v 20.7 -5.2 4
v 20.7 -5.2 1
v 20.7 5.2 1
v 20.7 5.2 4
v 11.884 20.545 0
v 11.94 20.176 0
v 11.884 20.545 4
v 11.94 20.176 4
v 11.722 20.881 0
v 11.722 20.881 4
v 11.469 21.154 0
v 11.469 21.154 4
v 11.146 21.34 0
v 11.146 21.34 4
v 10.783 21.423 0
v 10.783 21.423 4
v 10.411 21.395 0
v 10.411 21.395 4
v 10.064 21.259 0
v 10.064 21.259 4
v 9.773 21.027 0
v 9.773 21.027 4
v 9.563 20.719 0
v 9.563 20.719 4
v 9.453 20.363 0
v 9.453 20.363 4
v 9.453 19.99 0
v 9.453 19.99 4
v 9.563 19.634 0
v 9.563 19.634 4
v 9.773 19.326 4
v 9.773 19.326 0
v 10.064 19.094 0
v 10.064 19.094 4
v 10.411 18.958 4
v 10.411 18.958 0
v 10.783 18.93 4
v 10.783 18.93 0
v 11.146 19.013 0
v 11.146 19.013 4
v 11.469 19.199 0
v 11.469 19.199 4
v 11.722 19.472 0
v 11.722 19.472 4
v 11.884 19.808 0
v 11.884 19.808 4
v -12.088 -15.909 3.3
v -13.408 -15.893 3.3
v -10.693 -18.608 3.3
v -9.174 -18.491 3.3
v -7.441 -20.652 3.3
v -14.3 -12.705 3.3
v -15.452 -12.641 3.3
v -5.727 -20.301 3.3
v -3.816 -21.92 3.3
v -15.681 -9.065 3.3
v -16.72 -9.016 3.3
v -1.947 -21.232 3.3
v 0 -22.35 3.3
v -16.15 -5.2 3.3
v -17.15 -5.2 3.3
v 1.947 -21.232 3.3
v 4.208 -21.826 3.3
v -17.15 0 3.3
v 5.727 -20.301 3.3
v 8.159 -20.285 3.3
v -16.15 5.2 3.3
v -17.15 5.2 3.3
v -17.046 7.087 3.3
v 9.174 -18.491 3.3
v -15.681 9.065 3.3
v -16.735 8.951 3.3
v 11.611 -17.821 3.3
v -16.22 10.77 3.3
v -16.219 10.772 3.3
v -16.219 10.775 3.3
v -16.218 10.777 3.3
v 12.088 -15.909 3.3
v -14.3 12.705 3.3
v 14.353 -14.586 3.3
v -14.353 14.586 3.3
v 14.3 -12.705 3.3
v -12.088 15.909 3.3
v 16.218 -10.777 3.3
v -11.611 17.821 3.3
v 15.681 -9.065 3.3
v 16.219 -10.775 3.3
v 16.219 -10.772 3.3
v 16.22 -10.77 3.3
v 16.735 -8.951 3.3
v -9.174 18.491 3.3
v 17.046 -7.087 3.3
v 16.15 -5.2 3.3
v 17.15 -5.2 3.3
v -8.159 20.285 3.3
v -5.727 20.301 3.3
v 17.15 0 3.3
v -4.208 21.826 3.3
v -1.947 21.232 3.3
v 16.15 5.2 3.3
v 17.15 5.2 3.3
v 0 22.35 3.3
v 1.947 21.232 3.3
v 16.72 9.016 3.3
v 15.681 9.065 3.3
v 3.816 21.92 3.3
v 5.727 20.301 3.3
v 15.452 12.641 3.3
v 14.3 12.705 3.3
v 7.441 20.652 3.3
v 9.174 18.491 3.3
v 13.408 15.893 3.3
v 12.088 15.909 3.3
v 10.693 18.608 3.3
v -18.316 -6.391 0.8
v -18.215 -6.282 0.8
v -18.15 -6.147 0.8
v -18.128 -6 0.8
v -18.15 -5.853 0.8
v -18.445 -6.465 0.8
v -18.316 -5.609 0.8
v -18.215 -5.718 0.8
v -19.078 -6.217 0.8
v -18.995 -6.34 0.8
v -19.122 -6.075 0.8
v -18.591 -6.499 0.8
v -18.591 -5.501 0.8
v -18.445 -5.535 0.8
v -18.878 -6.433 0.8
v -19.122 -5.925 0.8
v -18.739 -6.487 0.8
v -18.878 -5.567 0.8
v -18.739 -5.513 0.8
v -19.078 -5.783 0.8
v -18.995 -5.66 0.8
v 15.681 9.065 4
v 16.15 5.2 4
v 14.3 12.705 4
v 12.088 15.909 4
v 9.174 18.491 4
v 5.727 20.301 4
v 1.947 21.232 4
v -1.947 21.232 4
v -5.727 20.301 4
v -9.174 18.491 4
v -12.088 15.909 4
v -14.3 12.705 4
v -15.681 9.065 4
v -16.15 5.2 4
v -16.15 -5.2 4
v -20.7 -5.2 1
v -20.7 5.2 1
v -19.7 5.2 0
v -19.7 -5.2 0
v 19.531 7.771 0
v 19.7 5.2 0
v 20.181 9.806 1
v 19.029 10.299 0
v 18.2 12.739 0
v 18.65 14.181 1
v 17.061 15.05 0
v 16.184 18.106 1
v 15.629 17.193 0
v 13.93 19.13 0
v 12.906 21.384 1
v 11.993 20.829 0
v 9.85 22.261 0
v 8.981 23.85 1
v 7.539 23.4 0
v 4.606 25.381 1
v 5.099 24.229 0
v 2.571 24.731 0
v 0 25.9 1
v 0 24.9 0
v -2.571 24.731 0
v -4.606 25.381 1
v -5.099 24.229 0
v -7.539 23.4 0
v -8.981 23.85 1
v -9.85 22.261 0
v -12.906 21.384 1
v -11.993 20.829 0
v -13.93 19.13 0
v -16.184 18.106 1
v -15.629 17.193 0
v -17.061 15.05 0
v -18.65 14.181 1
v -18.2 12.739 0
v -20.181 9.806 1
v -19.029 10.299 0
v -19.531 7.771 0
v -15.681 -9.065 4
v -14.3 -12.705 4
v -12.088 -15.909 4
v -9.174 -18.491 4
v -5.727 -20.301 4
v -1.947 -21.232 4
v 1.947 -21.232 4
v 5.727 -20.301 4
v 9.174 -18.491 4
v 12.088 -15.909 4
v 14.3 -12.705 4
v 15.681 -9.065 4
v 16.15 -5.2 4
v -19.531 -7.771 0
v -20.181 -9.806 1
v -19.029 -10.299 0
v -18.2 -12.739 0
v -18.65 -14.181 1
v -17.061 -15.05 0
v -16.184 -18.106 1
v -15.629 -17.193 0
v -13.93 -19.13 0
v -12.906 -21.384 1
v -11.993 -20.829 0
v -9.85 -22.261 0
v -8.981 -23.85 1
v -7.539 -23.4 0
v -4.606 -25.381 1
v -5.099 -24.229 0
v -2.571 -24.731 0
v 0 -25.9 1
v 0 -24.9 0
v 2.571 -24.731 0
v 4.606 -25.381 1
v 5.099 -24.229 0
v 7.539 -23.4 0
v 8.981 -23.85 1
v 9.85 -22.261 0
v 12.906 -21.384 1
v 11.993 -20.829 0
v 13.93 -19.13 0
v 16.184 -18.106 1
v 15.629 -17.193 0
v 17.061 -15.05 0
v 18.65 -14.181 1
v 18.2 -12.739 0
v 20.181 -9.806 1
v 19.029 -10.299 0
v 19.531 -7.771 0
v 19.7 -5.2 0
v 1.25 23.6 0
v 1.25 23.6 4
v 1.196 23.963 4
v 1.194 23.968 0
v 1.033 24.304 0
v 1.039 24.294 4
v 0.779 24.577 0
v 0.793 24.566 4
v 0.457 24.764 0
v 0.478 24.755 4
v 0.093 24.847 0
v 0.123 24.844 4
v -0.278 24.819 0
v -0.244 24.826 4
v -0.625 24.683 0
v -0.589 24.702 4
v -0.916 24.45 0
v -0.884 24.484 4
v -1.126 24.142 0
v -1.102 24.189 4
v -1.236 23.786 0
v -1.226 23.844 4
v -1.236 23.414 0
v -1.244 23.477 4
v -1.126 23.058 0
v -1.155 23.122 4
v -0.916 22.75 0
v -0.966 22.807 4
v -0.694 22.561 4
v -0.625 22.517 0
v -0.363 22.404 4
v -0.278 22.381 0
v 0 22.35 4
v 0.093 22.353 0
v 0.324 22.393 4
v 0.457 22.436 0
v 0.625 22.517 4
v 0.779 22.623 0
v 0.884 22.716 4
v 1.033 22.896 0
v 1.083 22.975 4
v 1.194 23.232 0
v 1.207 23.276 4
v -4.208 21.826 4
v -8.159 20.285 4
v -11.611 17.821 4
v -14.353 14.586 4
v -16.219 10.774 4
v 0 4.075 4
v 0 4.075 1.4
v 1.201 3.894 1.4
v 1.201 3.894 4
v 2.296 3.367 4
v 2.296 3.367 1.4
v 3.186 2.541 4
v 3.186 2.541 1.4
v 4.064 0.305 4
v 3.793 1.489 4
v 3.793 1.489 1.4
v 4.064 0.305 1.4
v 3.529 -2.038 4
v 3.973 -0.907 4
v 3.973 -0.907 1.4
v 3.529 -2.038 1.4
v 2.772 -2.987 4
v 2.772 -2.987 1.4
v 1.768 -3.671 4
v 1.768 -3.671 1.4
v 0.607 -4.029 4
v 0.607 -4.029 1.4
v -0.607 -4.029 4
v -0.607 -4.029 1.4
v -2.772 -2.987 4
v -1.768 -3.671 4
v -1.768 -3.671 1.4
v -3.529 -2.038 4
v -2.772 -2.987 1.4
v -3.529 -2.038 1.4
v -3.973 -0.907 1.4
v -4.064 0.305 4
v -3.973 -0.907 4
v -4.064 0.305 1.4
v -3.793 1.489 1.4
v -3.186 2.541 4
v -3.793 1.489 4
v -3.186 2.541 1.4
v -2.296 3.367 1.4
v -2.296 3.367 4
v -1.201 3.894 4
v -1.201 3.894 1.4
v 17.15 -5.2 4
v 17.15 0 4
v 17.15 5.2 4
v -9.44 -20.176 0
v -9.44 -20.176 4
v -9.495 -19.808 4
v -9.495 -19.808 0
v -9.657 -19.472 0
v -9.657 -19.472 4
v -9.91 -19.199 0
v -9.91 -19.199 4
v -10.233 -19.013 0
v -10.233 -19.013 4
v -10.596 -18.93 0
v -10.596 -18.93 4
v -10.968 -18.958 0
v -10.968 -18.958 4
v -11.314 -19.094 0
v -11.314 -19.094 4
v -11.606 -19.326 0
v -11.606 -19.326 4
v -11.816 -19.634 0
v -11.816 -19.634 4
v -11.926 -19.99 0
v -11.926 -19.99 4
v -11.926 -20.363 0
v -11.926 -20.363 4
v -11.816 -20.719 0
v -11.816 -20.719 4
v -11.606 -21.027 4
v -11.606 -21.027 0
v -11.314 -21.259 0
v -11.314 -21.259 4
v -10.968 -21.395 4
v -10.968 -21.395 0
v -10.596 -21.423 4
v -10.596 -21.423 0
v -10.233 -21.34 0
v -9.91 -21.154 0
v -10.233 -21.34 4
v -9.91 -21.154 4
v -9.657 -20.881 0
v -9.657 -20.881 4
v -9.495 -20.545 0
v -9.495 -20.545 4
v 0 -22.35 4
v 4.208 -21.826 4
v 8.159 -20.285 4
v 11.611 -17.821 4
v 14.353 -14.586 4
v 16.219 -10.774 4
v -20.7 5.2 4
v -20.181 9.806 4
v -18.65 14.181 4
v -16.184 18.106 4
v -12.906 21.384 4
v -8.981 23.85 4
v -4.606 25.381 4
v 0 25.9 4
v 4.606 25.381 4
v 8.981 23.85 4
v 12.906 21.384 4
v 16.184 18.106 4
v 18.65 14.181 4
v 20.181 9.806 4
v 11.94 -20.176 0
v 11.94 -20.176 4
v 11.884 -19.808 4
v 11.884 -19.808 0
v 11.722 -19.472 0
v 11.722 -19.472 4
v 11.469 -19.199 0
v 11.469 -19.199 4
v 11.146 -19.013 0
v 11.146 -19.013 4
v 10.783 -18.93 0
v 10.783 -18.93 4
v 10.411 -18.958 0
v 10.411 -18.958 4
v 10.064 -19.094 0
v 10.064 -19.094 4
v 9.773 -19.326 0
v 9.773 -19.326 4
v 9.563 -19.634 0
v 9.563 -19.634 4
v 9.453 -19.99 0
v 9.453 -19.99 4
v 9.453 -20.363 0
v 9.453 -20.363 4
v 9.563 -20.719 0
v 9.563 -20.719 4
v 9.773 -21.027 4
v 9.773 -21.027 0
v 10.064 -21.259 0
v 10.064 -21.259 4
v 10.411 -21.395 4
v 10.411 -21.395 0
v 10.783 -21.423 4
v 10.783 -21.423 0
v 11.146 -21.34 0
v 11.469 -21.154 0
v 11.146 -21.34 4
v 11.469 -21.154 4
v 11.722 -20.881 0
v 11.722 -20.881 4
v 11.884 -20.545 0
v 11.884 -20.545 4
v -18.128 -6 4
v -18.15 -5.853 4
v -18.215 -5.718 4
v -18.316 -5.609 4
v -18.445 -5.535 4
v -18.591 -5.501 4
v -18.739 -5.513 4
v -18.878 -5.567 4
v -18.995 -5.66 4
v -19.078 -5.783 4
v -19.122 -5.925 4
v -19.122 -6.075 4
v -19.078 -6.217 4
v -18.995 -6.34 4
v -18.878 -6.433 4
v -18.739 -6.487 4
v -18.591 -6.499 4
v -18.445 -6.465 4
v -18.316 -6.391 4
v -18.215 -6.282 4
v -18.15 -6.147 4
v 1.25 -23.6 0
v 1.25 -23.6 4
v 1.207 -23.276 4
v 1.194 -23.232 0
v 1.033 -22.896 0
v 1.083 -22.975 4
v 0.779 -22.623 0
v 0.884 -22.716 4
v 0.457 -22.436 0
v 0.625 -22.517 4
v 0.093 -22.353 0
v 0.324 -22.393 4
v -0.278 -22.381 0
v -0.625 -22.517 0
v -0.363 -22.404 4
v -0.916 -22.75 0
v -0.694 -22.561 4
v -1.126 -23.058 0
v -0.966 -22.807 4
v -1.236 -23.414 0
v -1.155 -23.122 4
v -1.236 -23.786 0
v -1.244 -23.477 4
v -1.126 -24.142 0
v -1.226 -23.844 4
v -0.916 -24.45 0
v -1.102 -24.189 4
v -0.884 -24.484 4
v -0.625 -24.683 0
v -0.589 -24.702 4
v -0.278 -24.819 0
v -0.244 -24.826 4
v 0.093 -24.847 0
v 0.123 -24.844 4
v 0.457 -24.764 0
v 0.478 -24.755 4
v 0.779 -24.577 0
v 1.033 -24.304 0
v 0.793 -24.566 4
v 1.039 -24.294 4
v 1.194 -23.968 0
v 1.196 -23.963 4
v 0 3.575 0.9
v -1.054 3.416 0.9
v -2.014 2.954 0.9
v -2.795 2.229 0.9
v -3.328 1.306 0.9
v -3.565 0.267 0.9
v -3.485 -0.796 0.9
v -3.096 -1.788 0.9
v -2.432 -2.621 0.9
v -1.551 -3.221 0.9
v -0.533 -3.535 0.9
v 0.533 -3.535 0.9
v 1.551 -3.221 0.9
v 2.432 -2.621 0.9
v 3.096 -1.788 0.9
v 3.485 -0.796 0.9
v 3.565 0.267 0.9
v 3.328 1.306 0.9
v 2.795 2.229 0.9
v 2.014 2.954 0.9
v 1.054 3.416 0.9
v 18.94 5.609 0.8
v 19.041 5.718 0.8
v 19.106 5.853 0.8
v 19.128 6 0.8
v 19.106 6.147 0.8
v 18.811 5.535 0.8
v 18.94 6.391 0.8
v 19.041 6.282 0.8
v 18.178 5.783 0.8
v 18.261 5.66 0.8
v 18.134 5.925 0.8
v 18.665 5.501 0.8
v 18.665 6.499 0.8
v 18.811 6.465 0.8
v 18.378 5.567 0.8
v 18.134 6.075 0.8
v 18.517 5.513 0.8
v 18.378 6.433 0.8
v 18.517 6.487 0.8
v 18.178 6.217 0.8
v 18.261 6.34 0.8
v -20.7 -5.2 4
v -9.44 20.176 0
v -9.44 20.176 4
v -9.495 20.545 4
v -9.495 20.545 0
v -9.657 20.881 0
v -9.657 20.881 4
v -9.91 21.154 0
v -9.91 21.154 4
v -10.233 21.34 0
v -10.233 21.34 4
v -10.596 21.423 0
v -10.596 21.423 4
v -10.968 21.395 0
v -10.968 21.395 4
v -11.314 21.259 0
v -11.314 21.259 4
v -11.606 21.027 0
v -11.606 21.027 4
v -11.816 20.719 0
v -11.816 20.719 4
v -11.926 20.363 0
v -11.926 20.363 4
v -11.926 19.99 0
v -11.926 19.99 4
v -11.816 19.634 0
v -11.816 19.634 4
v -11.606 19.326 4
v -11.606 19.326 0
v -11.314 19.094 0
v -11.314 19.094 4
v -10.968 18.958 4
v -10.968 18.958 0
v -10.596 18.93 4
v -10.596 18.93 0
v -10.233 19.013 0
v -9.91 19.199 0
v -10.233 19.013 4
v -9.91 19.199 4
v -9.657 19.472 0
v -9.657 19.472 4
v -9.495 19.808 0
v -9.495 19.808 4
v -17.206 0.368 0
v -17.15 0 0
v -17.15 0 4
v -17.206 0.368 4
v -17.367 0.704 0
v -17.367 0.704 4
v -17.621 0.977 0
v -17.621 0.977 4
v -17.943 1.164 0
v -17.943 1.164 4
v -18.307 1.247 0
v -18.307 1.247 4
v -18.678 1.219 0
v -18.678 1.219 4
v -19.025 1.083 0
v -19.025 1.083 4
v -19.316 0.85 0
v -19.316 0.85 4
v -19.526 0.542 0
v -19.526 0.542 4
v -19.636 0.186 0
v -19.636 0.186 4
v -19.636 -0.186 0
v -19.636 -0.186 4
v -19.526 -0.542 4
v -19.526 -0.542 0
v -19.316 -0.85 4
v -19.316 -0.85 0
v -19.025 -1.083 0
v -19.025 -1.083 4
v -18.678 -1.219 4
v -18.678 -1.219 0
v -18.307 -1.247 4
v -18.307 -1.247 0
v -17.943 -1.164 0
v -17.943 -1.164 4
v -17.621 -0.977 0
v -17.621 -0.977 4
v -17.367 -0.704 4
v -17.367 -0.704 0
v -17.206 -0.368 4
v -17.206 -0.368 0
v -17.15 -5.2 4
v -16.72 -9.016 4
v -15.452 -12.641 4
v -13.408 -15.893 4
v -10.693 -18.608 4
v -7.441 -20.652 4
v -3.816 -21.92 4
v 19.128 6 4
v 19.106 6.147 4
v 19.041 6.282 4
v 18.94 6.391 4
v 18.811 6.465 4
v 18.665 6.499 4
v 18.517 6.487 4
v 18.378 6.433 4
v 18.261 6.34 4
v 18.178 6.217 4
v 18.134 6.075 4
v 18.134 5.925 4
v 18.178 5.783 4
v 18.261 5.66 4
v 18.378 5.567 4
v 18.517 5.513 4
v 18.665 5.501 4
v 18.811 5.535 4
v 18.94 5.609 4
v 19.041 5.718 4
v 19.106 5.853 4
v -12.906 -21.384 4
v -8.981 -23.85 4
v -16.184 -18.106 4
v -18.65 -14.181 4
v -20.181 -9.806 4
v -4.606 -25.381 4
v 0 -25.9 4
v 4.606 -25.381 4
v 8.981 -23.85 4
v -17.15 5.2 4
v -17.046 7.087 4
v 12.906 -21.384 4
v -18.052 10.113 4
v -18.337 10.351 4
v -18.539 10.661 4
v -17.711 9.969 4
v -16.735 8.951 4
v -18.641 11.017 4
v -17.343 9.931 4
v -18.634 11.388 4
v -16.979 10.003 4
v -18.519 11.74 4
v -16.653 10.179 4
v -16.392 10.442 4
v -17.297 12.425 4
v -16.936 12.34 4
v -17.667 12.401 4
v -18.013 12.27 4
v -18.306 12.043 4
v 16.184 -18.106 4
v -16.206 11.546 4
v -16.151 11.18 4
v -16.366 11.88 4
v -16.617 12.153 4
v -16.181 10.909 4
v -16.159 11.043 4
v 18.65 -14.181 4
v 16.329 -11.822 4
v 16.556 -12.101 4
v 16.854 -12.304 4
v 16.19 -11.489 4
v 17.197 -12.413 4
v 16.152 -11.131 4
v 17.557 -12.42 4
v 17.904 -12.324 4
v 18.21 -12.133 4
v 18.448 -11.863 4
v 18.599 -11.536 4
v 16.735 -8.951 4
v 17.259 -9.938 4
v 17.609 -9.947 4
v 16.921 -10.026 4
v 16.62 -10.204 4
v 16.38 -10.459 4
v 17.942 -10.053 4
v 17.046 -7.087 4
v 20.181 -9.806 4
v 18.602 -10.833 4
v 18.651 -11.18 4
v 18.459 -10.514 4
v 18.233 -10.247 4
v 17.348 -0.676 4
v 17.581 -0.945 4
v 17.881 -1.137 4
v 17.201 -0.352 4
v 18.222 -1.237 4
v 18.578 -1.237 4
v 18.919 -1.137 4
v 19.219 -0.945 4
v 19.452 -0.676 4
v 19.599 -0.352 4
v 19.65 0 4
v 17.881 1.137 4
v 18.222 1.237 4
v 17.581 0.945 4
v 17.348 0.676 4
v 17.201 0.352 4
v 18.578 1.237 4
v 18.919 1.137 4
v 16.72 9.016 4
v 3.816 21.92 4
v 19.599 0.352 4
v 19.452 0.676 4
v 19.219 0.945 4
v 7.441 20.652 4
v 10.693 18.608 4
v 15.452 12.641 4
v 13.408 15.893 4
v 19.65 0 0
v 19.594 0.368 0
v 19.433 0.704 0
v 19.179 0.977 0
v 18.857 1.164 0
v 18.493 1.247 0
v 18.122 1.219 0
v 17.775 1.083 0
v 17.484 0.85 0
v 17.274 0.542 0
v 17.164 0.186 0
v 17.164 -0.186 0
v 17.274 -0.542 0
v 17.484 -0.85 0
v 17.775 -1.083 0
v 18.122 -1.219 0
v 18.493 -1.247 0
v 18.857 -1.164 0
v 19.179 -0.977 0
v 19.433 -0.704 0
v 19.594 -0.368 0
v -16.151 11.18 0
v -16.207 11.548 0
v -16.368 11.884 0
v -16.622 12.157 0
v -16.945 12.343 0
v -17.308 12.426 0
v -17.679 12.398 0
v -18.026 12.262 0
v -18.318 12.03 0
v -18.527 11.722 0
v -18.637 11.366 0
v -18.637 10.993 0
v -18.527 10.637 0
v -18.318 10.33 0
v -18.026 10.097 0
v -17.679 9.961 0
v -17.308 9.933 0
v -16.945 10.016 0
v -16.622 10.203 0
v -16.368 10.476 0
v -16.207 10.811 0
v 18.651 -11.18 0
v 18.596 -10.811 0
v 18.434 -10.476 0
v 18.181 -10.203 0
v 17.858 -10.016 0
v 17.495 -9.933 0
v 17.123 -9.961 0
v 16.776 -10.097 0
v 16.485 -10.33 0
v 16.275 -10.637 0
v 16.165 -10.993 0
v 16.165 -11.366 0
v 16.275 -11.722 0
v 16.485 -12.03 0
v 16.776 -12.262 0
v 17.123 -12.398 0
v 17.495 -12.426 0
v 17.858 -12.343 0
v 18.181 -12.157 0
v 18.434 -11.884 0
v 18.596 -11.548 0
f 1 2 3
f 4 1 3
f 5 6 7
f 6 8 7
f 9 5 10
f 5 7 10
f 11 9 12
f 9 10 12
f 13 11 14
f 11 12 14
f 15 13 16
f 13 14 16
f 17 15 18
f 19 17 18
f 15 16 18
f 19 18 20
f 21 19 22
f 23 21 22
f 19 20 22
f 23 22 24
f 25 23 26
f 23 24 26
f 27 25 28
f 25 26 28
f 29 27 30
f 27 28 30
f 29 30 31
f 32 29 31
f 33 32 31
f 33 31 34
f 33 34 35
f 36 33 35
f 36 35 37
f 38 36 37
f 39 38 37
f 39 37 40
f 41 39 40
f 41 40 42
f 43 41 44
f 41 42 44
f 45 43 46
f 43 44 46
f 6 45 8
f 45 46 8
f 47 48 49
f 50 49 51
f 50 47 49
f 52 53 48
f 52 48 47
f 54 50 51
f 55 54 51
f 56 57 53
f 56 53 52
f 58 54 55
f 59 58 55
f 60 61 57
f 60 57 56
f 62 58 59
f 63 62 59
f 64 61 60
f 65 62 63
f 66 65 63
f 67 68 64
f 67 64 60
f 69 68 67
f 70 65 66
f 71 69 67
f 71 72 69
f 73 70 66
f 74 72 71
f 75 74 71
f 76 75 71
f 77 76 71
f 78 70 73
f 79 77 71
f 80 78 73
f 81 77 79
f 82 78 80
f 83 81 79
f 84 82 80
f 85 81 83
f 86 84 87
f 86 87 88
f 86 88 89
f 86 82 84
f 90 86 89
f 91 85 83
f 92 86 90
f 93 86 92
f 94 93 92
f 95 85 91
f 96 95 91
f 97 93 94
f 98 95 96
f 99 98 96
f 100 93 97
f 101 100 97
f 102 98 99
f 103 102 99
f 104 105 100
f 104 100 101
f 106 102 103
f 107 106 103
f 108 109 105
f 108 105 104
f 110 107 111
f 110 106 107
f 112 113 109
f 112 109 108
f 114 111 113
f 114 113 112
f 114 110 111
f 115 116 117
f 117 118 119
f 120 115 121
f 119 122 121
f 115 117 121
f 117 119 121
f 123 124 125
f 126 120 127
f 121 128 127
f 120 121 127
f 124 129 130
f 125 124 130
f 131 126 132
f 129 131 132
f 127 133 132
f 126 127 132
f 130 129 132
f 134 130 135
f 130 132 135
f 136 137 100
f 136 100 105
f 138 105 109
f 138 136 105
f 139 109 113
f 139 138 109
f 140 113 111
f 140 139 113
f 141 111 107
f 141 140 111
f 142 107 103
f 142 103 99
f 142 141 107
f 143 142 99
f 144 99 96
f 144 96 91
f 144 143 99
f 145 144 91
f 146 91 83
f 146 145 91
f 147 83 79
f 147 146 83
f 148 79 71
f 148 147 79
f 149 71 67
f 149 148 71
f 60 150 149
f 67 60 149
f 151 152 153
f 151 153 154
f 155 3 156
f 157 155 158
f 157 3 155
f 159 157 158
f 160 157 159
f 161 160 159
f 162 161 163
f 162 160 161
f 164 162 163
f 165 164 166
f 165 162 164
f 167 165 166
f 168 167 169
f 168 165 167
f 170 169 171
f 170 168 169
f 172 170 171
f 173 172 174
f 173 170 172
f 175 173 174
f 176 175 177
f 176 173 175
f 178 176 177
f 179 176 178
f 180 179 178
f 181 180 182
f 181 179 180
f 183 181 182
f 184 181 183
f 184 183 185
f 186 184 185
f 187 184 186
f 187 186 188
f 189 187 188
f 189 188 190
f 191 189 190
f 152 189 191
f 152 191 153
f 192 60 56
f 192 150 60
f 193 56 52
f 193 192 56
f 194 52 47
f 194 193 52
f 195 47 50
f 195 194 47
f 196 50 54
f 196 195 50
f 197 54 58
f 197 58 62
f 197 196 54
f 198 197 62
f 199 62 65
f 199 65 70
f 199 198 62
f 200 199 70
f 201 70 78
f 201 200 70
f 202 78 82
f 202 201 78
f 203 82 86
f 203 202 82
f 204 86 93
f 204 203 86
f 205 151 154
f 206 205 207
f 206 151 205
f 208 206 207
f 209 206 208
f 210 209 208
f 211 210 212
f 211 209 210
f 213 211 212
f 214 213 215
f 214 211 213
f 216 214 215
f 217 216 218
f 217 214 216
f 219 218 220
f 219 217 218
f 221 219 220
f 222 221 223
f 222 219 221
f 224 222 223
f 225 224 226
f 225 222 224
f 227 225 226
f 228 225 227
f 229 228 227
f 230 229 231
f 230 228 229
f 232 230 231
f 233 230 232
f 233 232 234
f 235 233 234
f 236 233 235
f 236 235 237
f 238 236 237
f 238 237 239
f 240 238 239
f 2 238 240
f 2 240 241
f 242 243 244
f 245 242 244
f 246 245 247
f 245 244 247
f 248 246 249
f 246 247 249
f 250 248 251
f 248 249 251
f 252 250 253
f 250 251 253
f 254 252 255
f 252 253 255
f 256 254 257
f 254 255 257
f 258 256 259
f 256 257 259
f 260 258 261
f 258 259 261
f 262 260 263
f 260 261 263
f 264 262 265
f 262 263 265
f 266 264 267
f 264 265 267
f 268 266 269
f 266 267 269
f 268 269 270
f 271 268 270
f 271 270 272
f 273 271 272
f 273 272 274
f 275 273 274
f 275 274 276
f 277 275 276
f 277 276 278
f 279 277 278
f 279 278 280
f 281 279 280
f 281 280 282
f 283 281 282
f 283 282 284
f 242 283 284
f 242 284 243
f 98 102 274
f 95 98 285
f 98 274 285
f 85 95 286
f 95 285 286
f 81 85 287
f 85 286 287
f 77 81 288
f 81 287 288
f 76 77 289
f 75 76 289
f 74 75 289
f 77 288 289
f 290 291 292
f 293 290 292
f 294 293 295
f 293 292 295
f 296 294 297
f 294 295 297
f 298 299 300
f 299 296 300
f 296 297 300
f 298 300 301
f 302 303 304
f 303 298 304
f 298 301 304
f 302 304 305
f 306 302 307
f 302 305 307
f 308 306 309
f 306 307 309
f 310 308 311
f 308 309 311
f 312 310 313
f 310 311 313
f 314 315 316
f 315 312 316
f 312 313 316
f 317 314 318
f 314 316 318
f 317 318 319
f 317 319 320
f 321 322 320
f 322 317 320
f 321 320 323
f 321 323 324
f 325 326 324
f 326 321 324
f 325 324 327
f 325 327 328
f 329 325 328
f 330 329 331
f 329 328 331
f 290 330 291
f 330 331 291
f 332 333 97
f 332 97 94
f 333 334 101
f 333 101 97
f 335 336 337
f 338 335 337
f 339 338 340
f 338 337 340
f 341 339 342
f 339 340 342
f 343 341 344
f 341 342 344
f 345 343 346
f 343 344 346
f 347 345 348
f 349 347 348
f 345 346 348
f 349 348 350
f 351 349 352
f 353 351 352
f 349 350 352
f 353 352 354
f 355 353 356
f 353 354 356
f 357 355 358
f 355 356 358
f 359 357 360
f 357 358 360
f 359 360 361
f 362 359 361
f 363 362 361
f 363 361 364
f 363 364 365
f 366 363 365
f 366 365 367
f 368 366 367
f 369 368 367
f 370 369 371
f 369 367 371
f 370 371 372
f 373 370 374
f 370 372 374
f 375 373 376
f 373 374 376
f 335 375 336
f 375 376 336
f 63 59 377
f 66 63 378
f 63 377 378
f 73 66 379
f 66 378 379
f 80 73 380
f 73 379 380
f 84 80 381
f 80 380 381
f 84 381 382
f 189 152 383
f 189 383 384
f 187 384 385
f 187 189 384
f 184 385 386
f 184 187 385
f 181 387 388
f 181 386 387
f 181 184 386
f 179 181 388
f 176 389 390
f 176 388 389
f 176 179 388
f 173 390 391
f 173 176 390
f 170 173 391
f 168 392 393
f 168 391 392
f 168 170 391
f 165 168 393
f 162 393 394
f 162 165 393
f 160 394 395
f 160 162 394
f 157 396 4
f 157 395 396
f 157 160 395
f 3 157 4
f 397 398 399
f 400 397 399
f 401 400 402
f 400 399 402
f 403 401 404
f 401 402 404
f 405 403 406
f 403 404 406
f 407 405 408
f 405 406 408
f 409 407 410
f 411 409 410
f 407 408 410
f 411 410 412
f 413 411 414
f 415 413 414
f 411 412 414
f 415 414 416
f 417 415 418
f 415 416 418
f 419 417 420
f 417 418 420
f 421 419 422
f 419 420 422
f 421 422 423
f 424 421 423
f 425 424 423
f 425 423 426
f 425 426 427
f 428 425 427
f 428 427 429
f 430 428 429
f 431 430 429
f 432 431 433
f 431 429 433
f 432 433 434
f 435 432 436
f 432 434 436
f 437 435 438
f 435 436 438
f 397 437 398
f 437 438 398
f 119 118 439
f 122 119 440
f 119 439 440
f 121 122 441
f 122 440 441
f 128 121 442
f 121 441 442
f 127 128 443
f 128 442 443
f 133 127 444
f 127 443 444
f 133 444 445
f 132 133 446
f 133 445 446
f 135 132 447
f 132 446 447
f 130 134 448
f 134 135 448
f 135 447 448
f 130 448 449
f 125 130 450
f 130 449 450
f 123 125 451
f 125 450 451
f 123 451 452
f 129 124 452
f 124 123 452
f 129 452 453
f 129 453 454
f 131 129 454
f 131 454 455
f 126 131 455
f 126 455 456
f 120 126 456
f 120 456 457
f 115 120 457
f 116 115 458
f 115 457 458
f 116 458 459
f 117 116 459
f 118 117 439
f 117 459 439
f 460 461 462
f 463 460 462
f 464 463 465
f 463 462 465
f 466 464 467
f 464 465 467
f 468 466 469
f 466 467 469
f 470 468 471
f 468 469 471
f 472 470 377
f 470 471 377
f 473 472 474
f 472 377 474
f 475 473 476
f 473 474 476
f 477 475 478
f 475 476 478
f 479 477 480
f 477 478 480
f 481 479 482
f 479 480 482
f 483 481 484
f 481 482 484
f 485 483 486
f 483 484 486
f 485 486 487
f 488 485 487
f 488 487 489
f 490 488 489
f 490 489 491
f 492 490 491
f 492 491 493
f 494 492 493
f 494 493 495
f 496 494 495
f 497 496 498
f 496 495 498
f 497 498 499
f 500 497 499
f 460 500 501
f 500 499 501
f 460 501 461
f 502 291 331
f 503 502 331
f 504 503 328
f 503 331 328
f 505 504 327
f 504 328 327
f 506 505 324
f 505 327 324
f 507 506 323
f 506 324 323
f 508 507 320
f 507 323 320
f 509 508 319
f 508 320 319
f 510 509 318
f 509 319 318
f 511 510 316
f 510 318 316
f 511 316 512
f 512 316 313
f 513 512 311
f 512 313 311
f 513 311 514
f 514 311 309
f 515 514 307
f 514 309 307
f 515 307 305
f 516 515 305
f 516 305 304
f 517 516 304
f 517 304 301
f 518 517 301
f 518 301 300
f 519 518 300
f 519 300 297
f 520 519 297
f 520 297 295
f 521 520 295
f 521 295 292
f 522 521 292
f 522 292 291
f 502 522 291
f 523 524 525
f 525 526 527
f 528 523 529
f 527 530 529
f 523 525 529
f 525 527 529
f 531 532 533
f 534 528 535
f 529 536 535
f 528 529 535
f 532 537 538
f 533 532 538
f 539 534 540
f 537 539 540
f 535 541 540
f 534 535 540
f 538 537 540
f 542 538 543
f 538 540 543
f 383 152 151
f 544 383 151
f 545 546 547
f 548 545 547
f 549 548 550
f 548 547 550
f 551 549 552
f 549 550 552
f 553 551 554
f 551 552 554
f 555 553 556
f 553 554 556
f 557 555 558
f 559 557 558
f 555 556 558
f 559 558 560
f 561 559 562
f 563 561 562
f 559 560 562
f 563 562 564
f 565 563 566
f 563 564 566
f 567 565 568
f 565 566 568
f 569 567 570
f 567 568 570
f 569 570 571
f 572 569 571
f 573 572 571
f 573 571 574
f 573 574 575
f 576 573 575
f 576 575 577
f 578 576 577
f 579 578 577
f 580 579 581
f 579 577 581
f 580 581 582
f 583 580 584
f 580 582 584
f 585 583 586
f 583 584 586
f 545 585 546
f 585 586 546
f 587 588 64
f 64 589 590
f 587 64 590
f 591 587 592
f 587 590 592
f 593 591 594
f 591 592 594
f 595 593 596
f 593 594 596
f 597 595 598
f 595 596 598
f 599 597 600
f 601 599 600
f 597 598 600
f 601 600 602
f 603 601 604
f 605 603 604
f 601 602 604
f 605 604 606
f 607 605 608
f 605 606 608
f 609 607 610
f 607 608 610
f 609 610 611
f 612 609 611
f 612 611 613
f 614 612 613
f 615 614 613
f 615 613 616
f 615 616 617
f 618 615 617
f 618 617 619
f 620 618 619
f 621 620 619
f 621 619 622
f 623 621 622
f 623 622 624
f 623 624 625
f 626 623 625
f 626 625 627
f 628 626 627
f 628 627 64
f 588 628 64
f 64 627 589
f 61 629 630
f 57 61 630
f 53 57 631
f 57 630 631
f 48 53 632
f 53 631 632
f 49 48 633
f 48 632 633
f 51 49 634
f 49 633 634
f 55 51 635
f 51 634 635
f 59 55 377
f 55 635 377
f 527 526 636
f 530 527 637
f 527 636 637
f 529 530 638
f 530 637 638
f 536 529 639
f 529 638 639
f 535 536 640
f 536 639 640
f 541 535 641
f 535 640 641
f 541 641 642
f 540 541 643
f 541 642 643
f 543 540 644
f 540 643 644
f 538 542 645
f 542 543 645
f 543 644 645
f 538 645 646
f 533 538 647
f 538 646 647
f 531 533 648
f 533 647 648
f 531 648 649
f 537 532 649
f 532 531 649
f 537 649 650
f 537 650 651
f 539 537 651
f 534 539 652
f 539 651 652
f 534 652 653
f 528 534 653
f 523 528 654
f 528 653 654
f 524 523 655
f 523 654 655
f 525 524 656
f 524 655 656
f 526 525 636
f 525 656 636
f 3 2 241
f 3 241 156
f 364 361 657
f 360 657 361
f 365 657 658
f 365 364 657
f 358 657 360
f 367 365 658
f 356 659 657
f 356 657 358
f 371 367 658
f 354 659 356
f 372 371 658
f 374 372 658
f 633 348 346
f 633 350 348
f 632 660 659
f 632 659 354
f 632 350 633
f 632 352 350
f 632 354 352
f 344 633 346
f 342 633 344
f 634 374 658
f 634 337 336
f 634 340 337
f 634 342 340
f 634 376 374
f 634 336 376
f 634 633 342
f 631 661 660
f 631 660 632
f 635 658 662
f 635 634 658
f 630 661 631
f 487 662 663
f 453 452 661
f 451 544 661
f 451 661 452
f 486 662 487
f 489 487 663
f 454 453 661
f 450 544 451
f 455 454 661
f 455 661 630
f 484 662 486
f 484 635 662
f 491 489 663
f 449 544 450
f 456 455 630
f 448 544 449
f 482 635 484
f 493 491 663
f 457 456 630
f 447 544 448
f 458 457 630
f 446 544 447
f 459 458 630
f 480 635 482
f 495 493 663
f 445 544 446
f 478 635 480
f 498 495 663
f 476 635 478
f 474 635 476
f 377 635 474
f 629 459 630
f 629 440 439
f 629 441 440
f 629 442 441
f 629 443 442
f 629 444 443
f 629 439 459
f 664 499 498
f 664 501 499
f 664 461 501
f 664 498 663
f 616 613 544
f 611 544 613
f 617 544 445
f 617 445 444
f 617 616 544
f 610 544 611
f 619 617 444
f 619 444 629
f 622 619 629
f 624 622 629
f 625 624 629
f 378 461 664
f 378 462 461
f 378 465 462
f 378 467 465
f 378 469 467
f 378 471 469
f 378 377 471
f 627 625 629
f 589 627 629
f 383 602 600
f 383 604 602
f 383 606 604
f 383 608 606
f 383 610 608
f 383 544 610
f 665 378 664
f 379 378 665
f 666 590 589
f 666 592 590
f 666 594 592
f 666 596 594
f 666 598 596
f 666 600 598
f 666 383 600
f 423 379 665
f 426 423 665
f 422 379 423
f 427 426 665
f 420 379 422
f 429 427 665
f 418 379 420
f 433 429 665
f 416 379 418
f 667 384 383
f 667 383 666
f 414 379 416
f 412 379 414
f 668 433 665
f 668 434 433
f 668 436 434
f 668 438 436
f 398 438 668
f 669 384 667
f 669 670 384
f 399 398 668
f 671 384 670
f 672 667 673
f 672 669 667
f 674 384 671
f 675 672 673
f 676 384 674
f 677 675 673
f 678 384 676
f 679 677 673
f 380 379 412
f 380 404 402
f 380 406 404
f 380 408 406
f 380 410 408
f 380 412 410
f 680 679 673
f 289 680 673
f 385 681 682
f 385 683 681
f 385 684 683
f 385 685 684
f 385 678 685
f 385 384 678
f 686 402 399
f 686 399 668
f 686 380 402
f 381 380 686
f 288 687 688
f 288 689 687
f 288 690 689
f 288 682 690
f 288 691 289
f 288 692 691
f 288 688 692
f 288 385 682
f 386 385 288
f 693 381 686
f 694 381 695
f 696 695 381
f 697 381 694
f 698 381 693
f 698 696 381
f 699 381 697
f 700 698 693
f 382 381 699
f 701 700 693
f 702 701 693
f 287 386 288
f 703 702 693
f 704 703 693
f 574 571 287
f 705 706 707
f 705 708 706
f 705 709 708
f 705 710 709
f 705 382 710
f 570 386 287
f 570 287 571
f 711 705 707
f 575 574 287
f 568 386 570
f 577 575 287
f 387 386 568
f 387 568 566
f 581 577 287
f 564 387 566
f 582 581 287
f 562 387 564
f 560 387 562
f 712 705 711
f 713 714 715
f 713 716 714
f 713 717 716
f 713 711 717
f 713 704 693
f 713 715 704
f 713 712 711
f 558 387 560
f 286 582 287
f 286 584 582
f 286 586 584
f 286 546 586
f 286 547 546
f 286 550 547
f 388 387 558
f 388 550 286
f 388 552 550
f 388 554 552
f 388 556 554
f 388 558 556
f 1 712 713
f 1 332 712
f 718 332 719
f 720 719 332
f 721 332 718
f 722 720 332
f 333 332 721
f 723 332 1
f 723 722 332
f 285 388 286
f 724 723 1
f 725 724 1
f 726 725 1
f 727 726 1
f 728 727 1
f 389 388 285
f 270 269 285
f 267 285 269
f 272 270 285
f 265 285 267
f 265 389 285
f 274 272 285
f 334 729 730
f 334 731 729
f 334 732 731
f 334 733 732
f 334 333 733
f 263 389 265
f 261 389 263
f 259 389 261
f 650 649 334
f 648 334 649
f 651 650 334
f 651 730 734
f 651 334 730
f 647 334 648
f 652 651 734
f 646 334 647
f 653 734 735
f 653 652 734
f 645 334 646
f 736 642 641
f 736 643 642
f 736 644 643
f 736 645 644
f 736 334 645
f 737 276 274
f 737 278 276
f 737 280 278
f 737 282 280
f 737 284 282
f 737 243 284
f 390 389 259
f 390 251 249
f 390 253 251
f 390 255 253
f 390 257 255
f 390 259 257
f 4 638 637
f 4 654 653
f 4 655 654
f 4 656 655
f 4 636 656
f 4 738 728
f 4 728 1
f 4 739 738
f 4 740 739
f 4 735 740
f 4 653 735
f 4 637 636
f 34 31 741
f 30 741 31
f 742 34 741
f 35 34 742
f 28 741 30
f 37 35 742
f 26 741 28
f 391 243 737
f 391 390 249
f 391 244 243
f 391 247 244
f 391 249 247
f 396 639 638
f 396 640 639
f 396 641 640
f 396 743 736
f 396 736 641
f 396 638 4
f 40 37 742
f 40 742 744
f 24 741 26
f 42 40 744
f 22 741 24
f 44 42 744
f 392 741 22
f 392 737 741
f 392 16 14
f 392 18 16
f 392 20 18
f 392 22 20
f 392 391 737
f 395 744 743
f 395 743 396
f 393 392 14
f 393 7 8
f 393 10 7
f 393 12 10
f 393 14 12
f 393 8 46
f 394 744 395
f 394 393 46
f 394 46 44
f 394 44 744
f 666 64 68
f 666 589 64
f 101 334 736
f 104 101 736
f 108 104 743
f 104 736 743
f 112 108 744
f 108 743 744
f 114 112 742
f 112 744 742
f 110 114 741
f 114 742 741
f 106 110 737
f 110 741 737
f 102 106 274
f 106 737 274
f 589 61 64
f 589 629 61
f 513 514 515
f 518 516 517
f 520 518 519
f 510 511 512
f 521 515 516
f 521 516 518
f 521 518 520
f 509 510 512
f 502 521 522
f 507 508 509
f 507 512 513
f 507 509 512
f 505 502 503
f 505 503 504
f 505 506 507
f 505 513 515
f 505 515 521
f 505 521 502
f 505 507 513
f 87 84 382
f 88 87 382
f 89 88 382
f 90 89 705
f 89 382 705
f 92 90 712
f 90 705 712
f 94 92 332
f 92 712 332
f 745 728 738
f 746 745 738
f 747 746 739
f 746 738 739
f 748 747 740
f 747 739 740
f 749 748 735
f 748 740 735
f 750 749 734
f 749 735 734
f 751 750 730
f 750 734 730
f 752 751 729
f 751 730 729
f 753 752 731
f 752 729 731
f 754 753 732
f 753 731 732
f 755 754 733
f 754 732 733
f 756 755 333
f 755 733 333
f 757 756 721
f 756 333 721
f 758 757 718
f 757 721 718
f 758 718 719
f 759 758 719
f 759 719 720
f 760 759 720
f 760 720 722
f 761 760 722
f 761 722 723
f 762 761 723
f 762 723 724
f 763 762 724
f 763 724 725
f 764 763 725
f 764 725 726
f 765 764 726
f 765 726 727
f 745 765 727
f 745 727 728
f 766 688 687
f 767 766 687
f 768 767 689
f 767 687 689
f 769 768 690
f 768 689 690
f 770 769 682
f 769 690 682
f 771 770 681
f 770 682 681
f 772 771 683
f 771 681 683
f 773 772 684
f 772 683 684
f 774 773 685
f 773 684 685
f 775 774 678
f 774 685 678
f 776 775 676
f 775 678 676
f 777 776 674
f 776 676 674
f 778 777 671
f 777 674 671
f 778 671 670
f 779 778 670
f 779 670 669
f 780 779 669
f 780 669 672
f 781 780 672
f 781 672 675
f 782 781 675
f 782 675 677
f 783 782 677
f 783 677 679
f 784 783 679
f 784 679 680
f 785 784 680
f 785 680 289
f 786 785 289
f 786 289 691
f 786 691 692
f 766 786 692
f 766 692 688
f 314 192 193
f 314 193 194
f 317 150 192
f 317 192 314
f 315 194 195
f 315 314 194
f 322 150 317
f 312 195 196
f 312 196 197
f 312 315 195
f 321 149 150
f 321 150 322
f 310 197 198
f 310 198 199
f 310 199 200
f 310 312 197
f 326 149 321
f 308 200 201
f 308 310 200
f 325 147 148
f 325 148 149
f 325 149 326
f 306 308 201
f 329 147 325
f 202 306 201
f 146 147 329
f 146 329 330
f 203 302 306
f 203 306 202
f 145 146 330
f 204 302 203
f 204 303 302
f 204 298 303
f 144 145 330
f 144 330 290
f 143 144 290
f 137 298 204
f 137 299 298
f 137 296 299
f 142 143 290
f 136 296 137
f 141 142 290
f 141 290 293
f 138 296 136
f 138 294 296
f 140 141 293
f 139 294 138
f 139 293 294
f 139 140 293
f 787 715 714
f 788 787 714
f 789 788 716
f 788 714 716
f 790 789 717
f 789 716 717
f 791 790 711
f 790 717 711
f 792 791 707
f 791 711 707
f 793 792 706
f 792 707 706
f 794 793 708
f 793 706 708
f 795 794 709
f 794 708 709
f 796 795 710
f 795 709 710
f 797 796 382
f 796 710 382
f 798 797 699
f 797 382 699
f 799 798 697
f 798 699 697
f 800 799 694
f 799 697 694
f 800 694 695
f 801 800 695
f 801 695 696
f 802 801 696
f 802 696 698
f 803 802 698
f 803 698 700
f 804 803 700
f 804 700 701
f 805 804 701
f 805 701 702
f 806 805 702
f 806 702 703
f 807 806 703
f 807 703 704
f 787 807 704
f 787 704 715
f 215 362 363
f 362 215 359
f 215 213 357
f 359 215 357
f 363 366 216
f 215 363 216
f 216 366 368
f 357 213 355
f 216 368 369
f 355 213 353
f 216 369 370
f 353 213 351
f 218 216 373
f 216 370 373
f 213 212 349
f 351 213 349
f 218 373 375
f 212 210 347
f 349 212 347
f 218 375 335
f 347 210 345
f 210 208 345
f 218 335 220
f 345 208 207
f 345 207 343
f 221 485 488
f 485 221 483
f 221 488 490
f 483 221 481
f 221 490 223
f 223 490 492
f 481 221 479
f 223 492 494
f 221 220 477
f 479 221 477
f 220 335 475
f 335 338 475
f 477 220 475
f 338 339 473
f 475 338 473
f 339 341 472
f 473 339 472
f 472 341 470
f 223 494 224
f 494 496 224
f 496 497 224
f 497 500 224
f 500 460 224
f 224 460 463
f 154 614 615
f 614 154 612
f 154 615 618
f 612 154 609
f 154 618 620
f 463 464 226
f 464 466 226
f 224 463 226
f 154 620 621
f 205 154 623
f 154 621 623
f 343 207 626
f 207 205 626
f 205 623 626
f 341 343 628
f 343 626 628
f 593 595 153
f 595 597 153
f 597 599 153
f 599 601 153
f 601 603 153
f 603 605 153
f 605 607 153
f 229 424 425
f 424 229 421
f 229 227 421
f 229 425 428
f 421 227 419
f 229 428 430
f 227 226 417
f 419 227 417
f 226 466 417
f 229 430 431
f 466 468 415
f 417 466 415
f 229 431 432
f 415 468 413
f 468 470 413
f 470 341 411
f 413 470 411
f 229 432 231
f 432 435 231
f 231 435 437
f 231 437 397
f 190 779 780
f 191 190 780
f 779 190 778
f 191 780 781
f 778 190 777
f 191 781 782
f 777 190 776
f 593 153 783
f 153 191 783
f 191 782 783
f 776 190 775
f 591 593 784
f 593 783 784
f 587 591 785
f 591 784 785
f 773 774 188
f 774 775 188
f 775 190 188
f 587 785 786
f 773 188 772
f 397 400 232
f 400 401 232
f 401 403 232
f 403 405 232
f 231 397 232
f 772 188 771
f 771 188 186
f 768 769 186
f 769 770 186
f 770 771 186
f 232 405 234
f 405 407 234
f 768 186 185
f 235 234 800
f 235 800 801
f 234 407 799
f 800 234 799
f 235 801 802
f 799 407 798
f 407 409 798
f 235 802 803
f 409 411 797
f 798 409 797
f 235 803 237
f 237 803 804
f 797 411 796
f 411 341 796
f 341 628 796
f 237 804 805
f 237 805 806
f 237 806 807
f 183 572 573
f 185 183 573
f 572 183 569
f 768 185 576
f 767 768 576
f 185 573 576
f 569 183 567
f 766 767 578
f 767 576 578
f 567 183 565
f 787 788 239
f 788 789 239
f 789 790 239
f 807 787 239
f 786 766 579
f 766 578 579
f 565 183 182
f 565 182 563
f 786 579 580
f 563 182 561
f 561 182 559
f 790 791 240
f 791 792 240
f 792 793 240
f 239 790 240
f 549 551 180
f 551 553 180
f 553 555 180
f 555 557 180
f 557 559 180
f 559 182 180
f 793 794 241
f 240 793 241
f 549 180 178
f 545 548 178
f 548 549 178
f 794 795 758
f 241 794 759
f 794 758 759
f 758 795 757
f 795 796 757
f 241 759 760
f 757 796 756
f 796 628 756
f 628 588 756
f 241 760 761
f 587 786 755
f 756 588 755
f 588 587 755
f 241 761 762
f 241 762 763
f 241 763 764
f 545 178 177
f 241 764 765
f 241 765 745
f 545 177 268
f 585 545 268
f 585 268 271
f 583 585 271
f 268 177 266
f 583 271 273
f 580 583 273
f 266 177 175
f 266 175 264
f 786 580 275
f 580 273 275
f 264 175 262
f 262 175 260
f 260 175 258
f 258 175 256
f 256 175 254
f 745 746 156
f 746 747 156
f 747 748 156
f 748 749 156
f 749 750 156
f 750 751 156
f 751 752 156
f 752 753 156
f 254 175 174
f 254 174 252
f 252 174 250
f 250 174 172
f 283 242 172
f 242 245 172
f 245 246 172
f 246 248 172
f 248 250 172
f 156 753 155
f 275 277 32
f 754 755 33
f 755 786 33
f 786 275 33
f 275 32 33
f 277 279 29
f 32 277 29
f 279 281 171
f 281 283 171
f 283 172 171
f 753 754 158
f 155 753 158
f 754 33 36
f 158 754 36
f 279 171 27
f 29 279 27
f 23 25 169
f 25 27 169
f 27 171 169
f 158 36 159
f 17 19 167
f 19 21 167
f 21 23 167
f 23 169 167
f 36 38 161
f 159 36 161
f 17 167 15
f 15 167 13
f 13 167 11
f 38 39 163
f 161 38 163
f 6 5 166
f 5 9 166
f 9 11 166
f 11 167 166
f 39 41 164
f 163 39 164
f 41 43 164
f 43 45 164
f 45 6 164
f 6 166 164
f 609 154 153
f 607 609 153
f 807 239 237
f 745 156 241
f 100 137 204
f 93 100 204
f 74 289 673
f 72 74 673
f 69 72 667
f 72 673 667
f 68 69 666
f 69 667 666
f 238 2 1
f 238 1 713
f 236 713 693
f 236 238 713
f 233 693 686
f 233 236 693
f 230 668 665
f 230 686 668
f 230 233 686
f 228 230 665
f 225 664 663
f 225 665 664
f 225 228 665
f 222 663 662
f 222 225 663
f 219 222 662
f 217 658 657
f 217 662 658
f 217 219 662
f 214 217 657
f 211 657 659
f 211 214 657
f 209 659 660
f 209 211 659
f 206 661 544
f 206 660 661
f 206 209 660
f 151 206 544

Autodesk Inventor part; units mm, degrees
ref_plane "YZ Plane" through (0, 0, 0) normal (1, 0, 0) x (0, 1, 0)
ref_plane "XZ Plane" through (0, 0, 0) normal (0, 1, 0) x (-1, 0, 0)
ref_plane "XY Plane" through (0, 0, 0) normal (0, 0, 1) x (1, 0, 0)
sketch "Sketch1" plane through (0, 0, 0) normal (0, 0, 1) x (1, 0, 0)
  line L0 (0, 0) -> (0, 5.2) construction
  arc A0 (15.6034, 1.2322) -> (-15.6034, 1.2322) centre (0, 5.2) ccw construction
  line L1 (0, 0) -> (0, -5.2) construction
  arc A1 (-15.6034, -1.2322) -> (15.6034, -1.2322) centre (0, -5.2) ccw construction
  line L2 (0, 5.2) -> (0, -5.2) construction
  line L3 (-20.7, 5.2) -> (-20.7, -5.2)
  line L4 (20.7, -5.2) -> (20.7, 5.2)
  arc A2 (20.7, 5.2) -> (-20.7, 5.2) centre (0, 5.2) ccw
  arc A3 (-20.7, -5.2) -> (20.7, -5.2) centre (0, -5.2) ccw
  arc A4 (-15.6034, -1.2322) -> (-15.6034, 1.2322) centre (-20.4492, 0) ccw construction
  arc A5 (15.6034, 1.2322) -> (15.6034, -1.2322) centre (20.4492, 0) ccw construction
  line L5 (0, 5.2) -> (0, -5.2) construction
  circle A6 centre (0, 0) radius 14.5 construction
  dimension "d0" = 10.4
  dimension "d1" = 16.1
  dimension "d2" = 4.6
  dimension "d3" = 5
  dimension "d4" = 41.4
  dimension "d8" = 29
extrude "Extrusion1" add sketch "Sketch1" along normal blind 4
sketch "Sketch2" plane through (0, 0, 4) normal (0, 0, 1) x (1, 0, 0)
  line L0 (-20.7, 5.2) -> (-20.7, -5.2) construction
  arc A0 (-20.7, -5.2) -> (20.7, -5.2) centre (0, -5.2) ccw construction
  line L1 (20.7, -5.2) -> (20.7, 5.2) construction
  arc A1 (20.7, 5.2) -> (-20.7, 5.2) centre (0, 5.2) ccw construction
  line L2 (-18.4, 5.2) -> (-18.4, -5.2) construction
  arc A2 (-18.4, -5.2) -> (18.4, -5.2) centre (0, -5.2) ccw construction
  line L3 (18.4, -5.2) -> (18.4, 5.2) construction
  arc A3 (18.4, 5.2) -> (-18.4, 5.2) centre (0, 5.2) ccw construction
  circle A4 centre (-18.4, 0) radius 1.25
  circle A5 centre (0, 23.6) radius 1.25
  circle A6 centre (-10.6895, 20.1765) radius 1.25
  circle A7 centre (-17.4012, 11.1798) radius 1.25
  line L4 (-18.4, 0) -> (-17.4012, 11.1798) construction
  line L5 (-17.4012, 11.1798) -> (-10.6895, 20.1765) construction
  line L6 (-10.6895, 20.1765) -> (0, 23.6) construction
  line L7 (-18.4, 0) -> (0, 0) construction
  line L8 (0, 0) -> (0, 23.6) construction
  circle A8 centre (18.4, 0) radius 1.25
  circle A9 centre (10.6895, 20.1765) radius 1.25
  circle A10 centre (17.4012, 11.1798) radius 1.25
  circle A11 centre (0, -23.6) radius 1.25
  circle A12 centre (-10.6895, -20.1765) radius 1.25
  circle A13 centre (-17.4012, -11.1798) radius 1.25
  circle A14 centre (10.6895, -20.1765) radius 1.25
  circle A15 centre (17.4012, -11.1798) radius 1.25
  line L9 (-18.4, 0) -> (-18.4, -6) construction
  line L10 (-18.4, -6) -> (-18.628, -6) construction
  line L11 (18.4, 0) -> (18.4, 6) construction
  line L12 (18.4, 6) -> (18.628, 6) construction
  circle A16 centre (-18.628, -6) radius 0.5
  circle A17 centre (18.628, 6) radius 0.5
  dimension "d37" = 2.3
  dimension "d38" = 2.5
  dimension "d39" = 6
  dimension "d40" = 0.228
  dimension "d41" = 6
  dimension "d42" = 0.228
  dimension "d43" = 1
extrude "Extrusion2" cut sketch "Sketch2" against normal through all contours A4 | A5 | A6 | A7 | A8 | A9 | A11 | A12 | A14 | A15 | A16 | A17
sketch "Sketch5" plane through (0, 0, 4) normal (0, 0, 1) x (1, 0, 0)
  line L0 (20.7, -5.2) -> (20.7, 5.2) construction
  arc A0 (20.7, 5.2) -> (-20.7, 5.2) centre (0, 5.2) ccw construction
  line L1 (-20.7, 5.2) -> (-20.7, -5.2) construction
  arc A1 (-20.7, -5.2) -> (20.7, -5.2) centre (0, -5.2) ccw construction
  arc A2 (17.15, 5.2) -> (-17.15, 5.2) centre (0, 5.2) ccw
  line L2 (17.15, 5.2) -> (17.15, -5.2)
  arc A3 (-17.15, -5.2) -> (17.15, -5.2) centre (0, -5.2) ccw
  line L3 (-17.15, -5.2) -> (-17.15, 5.2)
  arc A4 (16.15, 5.2) -> (-16.15, 5.2) centre (0, 5.2) ccw
  line L4 (16.15, 5.2) -> (16.15, -5.2)
  arc A5 (-16.15, -5.2) -> (16.15, -5.2) centre (0, -5.2) ccw
  line L5 (-16.15, -5.2) -> (-16.15, 5.2)
  point P0 (0, 0)
  dimension "d20" = 1
extrude "Extrusion5" cut sketch "Sketch5" against normal blind 0.7
fillet "Fillet1" [suppressed]
chamfer "Chamfer1" distance 1 angle 45 4 edges at (0, -25.9, 0) (20.7, 0, 0) (0, 25.9, 0) (-20.7, 0, 0)
sketch "Sketch8" plane through (0, 0, 0) normal (1, 0, 0) x (0, 1, 0)
  line L0 (0, 0) -> (5.2, 0) construction
  line L1 (0, 0) -> (0, 0.9) construction
  line L2 (-5.2, 4) -> (5.2, 4) construction
  line L3 (0, 4) -> (4.075, 4)
  line L4 (4.075, 4) -> (4.075, 1.4)
  line L5 (4.075, 1.4) -> (3.575, 0.9)
  line L6 (3.575, 0.9) -> (0, 0.9)
  line L7 (0, 0.9) -> (0, 4)
  dimension "d44" = 4.075
  dimension "d45" = 135
  dimension "d46" = 2.6
  dimension "d47" = 0.5
  dimension "d48" = 0.9
revolve "Revolution1" cut sketch "Sketch8" angle 360 about axis through (0, 0, 0.9) along (0, 0, 1)
sketch "Sketch9" plane through (0, 0, 0) normal (0, 0, -1) x (-1, 0, 0)
  circle A0 centre (-18.628, 6) radius 0.5 projected
  circle A1 centre (18.628, -6) radius 0.5 projected
  point P0 (0, 0)
extrude "Extrusion8" add sketch "Sketch9" against normal blind 0.8
properties part number "housingPlate"
